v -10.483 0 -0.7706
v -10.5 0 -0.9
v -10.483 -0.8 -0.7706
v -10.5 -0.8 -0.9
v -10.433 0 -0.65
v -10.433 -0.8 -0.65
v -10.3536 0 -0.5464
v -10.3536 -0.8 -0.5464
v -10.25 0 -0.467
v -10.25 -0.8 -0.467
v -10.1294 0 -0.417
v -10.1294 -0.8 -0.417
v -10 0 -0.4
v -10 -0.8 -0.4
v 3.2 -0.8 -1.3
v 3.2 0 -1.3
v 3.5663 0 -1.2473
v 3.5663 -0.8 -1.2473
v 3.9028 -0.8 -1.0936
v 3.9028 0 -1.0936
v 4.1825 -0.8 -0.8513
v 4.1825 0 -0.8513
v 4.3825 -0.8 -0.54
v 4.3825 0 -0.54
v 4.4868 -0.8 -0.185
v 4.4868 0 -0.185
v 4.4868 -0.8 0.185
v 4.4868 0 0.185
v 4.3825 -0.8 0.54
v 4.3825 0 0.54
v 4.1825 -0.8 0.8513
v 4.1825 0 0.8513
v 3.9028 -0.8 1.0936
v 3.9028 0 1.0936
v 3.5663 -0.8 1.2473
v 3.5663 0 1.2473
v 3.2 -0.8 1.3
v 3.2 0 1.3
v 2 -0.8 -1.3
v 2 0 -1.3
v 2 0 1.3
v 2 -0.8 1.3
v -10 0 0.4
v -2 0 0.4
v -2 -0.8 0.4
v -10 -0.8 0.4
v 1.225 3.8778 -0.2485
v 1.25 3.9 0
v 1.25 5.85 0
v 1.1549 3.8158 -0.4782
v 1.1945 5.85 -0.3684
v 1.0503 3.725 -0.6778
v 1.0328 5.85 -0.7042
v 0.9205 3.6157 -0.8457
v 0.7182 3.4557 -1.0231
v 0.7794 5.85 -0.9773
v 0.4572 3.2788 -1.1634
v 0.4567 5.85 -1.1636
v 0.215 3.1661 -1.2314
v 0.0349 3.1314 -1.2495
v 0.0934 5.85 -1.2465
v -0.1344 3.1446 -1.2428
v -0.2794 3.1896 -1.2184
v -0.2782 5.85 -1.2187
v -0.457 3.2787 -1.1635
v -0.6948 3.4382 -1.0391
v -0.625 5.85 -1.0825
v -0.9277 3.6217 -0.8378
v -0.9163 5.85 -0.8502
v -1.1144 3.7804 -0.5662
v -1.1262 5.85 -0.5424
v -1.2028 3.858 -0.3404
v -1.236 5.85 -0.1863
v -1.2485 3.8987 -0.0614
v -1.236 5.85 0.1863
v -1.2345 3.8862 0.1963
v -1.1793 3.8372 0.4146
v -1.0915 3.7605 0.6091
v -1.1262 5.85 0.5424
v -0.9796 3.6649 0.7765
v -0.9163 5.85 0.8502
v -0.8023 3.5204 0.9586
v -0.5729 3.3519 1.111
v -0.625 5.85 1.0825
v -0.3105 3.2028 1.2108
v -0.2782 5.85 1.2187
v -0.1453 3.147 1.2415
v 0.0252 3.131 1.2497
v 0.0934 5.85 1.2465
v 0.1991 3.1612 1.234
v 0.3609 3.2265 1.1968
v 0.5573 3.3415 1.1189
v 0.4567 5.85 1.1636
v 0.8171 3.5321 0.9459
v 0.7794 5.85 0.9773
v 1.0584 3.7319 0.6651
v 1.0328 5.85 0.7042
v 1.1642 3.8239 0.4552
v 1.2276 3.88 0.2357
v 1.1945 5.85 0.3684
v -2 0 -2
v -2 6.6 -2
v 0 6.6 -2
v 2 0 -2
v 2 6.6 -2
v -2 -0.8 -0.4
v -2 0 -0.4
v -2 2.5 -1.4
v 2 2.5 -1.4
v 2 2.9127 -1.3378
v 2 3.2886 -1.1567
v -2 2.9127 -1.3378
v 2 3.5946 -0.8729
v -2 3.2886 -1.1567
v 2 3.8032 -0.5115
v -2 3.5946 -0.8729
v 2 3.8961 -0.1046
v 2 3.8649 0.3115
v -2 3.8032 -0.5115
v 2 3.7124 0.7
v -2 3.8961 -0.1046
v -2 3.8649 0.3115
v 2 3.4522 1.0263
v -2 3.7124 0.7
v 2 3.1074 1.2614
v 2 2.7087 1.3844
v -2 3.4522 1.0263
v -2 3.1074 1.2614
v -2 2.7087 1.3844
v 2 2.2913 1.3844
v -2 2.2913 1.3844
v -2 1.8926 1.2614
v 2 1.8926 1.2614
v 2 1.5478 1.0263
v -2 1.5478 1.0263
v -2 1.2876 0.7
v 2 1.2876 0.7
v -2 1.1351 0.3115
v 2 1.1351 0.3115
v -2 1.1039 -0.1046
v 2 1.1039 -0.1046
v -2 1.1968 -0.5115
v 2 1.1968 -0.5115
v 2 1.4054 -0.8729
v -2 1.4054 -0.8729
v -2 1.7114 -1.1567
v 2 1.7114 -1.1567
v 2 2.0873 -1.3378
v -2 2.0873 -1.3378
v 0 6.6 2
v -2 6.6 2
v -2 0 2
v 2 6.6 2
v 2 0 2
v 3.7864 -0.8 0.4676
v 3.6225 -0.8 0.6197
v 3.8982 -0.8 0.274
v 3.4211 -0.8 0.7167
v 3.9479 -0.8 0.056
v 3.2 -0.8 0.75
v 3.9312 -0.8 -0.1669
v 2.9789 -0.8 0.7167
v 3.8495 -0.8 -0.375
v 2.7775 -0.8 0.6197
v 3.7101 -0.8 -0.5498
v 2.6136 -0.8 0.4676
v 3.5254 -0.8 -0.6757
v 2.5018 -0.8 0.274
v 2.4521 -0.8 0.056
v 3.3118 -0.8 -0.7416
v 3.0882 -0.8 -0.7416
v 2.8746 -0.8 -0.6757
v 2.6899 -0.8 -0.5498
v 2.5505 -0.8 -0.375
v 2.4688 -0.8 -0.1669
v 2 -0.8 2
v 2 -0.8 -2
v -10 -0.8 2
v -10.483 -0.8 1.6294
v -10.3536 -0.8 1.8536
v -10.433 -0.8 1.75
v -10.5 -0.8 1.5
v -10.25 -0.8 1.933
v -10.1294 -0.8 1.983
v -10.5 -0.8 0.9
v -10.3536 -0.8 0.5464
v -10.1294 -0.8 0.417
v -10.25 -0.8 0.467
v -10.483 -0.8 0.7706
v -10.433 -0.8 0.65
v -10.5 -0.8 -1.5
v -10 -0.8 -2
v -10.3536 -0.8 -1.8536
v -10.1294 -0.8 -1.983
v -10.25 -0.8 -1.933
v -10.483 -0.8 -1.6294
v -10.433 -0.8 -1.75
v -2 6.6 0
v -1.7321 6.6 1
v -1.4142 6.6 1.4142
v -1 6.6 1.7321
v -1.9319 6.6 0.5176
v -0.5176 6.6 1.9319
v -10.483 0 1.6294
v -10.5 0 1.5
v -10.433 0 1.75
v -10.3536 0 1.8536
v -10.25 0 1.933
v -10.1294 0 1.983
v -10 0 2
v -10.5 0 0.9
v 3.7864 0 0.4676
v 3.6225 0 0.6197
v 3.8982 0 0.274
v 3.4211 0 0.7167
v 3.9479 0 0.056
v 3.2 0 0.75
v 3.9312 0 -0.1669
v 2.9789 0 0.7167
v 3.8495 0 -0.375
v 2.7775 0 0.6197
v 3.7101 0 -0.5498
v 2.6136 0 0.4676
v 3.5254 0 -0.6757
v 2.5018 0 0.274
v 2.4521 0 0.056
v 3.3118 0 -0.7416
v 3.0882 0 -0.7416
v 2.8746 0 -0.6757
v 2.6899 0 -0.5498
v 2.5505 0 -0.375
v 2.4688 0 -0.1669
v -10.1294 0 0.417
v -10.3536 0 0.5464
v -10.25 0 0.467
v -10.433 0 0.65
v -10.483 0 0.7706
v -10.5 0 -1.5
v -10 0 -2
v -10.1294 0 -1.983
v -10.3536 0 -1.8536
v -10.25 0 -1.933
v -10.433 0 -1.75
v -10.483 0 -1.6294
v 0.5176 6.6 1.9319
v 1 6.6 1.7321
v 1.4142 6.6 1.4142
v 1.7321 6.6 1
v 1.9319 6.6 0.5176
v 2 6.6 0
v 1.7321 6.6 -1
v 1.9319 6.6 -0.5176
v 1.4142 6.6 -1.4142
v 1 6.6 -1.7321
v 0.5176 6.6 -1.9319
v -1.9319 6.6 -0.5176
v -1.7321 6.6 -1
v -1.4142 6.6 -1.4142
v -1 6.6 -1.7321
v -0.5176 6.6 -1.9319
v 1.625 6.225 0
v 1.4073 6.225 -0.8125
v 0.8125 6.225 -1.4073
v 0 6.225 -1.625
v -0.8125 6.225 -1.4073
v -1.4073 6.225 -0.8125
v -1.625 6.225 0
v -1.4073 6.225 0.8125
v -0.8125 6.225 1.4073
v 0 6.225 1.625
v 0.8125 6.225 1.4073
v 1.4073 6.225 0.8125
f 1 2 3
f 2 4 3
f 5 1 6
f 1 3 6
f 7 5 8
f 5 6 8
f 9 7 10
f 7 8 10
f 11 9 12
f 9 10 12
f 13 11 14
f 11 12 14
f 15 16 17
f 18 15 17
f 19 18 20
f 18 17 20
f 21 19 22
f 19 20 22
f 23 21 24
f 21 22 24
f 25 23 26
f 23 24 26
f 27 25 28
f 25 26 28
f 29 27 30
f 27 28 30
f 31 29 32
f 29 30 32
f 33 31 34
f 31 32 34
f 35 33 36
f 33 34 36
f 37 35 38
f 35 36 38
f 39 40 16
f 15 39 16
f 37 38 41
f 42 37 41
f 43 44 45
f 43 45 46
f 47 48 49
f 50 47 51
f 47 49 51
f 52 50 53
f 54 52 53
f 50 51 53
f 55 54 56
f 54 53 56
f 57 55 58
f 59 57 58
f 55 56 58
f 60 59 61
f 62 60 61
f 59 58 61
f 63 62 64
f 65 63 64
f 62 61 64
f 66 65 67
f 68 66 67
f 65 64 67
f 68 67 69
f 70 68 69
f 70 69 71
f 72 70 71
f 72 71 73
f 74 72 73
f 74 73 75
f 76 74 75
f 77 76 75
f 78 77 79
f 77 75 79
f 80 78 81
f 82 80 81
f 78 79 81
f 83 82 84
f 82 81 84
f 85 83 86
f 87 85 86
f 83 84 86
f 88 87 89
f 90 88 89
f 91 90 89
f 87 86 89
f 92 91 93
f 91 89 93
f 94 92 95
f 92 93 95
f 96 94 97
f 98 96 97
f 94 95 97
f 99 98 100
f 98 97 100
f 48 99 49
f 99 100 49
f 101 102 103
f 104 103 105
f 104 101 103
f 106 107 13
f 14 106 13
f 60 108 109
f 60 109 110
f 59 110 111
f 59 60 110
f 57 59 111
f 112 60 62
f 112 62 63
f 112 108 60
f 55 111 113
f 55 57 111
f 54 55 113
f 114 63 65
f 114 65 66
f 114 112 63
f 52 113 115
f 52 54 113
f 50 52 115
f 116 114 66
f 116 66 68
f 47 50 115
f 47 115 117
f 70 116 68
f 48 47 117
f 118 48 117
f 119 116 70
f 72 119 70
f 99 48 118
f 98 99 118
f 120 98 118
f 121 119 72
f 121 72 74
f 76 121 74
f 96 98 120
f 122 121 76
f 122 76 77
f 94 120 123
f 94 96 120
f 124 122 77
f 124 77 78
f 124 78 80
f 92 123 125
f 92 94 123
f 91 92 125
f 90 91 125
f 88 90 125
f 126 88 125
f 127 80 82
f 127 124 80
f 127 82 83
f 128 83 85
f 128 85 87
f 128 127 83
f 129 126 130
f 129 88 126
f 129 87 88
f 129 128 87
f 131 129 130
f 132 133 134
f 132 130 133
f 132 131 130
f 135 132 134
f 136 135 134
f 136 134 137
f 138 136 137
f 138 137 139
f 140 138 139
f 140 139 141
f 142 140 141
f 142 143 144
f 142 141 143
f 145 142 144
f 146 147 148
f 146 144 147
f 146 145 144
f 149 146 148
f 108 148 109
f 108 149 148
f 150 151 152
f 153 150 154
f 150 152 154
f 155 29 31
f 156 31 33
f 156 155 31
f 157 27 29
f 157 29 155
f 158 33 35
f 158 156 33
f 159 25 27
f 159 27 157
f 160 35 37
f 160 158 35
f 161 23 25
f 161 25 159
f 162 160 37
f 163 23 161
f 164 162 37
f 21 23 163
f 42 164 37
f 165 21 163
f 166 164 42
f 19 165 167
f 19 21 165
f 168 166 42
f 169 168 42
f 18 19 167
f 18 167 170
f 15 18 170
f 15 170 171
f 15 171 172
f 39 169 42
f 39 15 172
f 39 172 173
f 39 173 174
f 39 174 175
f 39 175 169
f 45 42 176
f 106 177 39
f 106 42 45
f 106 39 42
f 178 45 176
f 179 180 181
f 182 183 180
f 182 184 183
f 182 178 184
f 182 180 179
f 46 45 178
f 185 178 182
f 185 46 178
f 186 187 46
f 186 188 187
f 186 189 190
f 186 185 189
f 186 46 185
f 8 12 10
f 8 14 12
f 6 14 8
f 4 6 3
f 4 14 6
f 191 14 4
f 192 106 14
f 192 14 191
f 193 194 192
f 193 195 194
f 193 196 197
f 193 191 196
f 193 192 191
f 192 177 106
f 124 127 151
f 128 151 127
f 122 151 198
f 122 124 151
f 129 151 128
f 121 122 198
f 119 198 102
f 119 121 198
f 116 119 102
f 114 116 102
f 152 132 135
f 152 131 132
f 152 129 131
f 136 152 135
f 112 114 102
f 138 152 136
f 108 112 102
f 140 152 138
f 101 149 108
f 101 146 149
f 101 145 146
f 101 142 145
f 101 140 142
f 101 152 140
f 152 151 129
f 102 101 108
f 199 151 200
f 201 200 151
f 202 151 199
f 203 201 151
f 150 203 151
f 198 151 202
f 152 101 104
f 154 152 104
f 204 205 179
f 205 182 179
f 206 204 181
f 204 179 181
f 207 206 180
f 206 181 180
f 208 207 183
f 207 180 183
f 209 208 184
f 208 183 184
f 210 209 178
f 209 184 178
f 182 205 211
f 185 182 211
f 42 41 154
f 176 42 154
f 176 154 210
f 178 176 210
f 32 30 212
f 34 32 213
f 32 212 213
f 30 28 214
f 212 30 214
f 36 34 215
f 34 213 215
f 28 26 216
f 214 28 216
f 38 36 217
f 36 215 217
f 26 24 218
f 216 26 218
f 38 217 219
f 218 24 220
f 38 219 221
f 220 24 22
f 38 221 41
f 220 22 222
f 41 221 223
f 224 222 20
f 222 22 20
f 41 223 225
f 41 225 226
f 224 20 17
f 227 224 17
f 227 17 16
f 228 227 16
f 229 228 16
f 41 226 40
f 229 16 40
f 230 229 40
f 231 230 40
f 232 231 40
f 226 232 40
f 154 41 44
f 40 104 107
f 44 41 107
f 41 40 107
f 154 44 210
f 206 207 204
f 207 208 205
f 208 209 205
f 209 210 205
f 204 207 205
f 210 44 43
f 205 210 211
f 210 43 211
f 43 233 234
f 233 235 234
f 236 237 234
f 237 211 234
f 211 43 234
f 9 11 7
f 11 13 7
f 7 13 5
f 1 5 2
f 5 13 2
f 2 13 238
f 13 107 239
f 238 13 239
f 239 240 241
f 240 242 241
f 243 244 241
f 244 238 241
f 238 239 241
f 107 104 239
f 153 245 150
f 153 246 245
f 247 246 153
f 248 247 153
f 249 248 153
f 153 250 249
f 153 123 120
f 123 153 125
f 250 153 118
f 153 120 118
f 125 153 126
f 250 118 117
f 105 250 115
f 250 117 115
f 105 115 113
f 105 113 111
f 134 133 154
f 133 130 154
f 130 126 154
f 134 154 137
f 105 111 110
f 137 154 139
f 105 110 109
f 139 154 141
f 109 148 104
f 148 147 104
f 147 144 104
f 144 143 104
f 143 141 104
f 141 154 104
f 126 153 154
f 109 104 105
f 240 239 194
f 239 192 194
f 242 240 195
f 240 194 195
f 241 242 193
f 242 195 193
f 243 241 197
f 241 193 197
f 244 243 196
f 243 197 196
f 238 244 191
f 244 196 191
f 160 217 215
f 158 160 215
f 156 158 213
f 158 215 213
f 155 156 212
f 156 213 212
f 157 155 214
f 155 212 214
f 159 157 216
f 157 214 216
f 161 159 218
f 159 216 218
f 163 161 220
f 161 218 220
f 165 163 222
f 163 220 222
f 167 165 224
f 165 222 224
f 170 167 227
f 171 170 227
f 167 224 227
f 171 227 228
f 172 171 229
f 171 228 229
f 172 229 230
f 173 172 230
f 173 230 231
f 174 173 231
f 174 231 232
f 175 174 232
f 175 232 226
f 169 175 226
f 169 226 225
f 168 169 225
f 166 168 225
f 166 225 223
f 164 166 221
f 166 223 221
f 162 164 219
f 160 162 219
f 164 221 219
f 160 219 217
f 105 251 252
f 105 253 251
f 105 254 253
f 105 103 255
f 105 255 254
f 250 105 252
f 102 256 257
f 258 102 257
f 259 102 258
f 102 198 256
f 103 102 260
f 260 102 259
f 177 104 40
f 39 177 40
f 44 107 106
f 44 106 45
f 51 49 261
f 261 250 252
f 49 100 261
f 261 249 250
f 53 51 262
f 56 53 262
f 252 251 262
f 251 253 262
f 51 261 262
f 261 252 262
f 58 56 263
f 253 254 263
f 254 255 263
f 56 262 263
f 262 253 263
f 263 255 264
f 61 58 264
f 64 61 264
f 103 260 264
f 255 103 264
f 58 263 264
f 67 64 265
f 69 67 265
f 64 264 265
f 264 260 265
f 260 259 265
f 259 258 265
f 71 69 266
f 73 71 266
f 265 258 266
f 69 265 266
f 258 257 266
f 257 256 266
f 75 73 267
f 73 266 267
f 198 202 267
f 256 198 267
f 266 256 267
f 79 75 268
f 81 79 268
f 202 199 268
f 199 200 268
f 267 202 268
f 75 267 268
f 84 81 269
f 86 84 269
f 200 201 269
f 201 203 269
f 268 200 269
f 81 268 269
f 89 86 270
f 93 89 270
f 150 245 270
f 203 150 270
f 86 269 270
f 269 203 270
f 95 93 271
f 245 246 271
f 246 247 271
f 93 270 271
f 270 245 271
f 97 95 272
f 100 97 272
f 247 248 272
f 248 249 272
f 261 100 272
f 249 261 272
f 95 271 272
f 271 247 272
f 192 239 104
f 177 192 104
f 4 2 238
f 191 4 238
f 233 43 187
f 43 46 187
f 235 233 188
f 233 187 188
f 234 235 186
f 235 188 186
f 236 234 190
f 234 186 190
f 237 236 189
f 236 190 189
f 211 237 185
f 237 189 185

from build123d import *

# Parameters (mm, degrees)
TERMINALBODYS_W             = 4
TERMINALBODYS_H             = 4
TERMINAL_BODY_DEPTH         = 6.6
WIRE_ACCESS_DEPTH           = 8.180529228
WIRE_ACCESS_DEPTH_BACK      = 8.180529228
WIREACCESSS_R               = 1.4
SOLDERCONNECTIONS_R         = 0.75
SOLDER_CONNECTION_DEPTH     = 0.8
SOLDERCONNECTIONCUTS_W      = 8.5
SOLDERCONNECTIONCUTS_H      = 0.8
SOLDER_CONNECTION_CUT_DEPTH = 13.562245022
SCF_R                       = 0.5


# Read off the part's stored shape, not the designer's step: M3x0.5 Tapped Hole1
with BuildPart() as part:
    # TerminalBodyS → TERMINAL BODY (new body)
    with BuildSketch(Plane(origin=(0, 0, 0), x_dir=(1, 0, 0), z_dir=(0, 1, 0))):
        Rectangle(TERMINALBODYS_W, TERMINALBODYS_H)
    extrude(amount=TERMINAL_BODY_DEPTH)

    # WireAccessS → WIRE ACCESS (cut, two sides: drawn at the far end of the back side and taken through both)
    with BuildSketch(Plane(origin=(0, 0, 0), x_dir=(0, 0, -1), z_dir=(1, 0, 0)).offset(-WIRE_ACCESS_DEPTH_BACK)):
        with Locations((0, 2.5)):
            Circle(WIREACCESSS_R)
    extrude(amount=WIRE_ACCESS_DEPTH + WIRE_ACCESS_DEPTH_BACK, mode=Mode.SUBTRACT)

    # M3x0.5 Tapped Hole1 outline → M3x0.5 Tapped Hole1 (revolve, cut)
    with BuildSketch(Plane.XY):
        Polygon((0, 3.129982186), (1.25, 3.129982186), (1.25, 5.85), (2, 6.6), (0, 6.6), align=None)
    revolve(axis=Axis((0, 0, 0), (0, 1, 0)), mode=Mode.SUBTRACT)


with BuildPart() as body_2:
    # SolderConnectionS → SOLDER CONNECTION (new body)
    with BuildSketch(Plane(origin=(0, 0, 0), x_dir=(1, 0, 0), z_dir=(0, 1, 0))):
        with BuildLine():
            Line((2, 1.3), (3.2, 1.3))
            ThreePointArc((3.2, 1.3), (4.5, 0), (3.2, -1.3))
            Line((3.2, -1.3), (2, -1.3))
            Line((2, -1.3), (2, -2))
            Line((2, -2), (-10.5, -2))
            Line((-10.5, -2), (-10.5, 2))
            Line((-10.5, 2), (2, 2))
            Line((2, 2), (2, 1.3))
        make_face()
        with Locations(Location((3.2, 0, 0), (0, 0, 270))):
            Circle(SOLDERCONNECTIONS_R, mode=Mode.SUBTRACT)
    extrude(amount=-SOLDER_CONNECTION_DEPTH)

    # SolderConnectionCutS → SOLDER CONNECTION CUT (cut, through all)
    with BuildSketch(Plane(origin=(0, 0, 0), x_dir=(-1, 0, 0), z_dir=(0, 1, 0))):
        with Locations((6.25, 0)):
            Rectangle(SOLDERCONNECTIONCUTS_W, SOLDERCONNECTIONCUTS_H)
    extrude(amount=-SOLDER_CONNECTION_CUT_DEPTH, mode=Mode.SUBTRACT)

    # SCF
    scf_edges = [body_2.edges().sort_by_distance(p)[0] for p in [
        (-10.5, -0.4, 2),
        (-10.5, -0.4, -2),
        (-10.5, -0.4, 0.4),
        (-10.5, -0.4, -0.4),
    ]]
    fillet(scf_edges, radius=SCF_R)


solid = Compound([part.part, body_2.part])
